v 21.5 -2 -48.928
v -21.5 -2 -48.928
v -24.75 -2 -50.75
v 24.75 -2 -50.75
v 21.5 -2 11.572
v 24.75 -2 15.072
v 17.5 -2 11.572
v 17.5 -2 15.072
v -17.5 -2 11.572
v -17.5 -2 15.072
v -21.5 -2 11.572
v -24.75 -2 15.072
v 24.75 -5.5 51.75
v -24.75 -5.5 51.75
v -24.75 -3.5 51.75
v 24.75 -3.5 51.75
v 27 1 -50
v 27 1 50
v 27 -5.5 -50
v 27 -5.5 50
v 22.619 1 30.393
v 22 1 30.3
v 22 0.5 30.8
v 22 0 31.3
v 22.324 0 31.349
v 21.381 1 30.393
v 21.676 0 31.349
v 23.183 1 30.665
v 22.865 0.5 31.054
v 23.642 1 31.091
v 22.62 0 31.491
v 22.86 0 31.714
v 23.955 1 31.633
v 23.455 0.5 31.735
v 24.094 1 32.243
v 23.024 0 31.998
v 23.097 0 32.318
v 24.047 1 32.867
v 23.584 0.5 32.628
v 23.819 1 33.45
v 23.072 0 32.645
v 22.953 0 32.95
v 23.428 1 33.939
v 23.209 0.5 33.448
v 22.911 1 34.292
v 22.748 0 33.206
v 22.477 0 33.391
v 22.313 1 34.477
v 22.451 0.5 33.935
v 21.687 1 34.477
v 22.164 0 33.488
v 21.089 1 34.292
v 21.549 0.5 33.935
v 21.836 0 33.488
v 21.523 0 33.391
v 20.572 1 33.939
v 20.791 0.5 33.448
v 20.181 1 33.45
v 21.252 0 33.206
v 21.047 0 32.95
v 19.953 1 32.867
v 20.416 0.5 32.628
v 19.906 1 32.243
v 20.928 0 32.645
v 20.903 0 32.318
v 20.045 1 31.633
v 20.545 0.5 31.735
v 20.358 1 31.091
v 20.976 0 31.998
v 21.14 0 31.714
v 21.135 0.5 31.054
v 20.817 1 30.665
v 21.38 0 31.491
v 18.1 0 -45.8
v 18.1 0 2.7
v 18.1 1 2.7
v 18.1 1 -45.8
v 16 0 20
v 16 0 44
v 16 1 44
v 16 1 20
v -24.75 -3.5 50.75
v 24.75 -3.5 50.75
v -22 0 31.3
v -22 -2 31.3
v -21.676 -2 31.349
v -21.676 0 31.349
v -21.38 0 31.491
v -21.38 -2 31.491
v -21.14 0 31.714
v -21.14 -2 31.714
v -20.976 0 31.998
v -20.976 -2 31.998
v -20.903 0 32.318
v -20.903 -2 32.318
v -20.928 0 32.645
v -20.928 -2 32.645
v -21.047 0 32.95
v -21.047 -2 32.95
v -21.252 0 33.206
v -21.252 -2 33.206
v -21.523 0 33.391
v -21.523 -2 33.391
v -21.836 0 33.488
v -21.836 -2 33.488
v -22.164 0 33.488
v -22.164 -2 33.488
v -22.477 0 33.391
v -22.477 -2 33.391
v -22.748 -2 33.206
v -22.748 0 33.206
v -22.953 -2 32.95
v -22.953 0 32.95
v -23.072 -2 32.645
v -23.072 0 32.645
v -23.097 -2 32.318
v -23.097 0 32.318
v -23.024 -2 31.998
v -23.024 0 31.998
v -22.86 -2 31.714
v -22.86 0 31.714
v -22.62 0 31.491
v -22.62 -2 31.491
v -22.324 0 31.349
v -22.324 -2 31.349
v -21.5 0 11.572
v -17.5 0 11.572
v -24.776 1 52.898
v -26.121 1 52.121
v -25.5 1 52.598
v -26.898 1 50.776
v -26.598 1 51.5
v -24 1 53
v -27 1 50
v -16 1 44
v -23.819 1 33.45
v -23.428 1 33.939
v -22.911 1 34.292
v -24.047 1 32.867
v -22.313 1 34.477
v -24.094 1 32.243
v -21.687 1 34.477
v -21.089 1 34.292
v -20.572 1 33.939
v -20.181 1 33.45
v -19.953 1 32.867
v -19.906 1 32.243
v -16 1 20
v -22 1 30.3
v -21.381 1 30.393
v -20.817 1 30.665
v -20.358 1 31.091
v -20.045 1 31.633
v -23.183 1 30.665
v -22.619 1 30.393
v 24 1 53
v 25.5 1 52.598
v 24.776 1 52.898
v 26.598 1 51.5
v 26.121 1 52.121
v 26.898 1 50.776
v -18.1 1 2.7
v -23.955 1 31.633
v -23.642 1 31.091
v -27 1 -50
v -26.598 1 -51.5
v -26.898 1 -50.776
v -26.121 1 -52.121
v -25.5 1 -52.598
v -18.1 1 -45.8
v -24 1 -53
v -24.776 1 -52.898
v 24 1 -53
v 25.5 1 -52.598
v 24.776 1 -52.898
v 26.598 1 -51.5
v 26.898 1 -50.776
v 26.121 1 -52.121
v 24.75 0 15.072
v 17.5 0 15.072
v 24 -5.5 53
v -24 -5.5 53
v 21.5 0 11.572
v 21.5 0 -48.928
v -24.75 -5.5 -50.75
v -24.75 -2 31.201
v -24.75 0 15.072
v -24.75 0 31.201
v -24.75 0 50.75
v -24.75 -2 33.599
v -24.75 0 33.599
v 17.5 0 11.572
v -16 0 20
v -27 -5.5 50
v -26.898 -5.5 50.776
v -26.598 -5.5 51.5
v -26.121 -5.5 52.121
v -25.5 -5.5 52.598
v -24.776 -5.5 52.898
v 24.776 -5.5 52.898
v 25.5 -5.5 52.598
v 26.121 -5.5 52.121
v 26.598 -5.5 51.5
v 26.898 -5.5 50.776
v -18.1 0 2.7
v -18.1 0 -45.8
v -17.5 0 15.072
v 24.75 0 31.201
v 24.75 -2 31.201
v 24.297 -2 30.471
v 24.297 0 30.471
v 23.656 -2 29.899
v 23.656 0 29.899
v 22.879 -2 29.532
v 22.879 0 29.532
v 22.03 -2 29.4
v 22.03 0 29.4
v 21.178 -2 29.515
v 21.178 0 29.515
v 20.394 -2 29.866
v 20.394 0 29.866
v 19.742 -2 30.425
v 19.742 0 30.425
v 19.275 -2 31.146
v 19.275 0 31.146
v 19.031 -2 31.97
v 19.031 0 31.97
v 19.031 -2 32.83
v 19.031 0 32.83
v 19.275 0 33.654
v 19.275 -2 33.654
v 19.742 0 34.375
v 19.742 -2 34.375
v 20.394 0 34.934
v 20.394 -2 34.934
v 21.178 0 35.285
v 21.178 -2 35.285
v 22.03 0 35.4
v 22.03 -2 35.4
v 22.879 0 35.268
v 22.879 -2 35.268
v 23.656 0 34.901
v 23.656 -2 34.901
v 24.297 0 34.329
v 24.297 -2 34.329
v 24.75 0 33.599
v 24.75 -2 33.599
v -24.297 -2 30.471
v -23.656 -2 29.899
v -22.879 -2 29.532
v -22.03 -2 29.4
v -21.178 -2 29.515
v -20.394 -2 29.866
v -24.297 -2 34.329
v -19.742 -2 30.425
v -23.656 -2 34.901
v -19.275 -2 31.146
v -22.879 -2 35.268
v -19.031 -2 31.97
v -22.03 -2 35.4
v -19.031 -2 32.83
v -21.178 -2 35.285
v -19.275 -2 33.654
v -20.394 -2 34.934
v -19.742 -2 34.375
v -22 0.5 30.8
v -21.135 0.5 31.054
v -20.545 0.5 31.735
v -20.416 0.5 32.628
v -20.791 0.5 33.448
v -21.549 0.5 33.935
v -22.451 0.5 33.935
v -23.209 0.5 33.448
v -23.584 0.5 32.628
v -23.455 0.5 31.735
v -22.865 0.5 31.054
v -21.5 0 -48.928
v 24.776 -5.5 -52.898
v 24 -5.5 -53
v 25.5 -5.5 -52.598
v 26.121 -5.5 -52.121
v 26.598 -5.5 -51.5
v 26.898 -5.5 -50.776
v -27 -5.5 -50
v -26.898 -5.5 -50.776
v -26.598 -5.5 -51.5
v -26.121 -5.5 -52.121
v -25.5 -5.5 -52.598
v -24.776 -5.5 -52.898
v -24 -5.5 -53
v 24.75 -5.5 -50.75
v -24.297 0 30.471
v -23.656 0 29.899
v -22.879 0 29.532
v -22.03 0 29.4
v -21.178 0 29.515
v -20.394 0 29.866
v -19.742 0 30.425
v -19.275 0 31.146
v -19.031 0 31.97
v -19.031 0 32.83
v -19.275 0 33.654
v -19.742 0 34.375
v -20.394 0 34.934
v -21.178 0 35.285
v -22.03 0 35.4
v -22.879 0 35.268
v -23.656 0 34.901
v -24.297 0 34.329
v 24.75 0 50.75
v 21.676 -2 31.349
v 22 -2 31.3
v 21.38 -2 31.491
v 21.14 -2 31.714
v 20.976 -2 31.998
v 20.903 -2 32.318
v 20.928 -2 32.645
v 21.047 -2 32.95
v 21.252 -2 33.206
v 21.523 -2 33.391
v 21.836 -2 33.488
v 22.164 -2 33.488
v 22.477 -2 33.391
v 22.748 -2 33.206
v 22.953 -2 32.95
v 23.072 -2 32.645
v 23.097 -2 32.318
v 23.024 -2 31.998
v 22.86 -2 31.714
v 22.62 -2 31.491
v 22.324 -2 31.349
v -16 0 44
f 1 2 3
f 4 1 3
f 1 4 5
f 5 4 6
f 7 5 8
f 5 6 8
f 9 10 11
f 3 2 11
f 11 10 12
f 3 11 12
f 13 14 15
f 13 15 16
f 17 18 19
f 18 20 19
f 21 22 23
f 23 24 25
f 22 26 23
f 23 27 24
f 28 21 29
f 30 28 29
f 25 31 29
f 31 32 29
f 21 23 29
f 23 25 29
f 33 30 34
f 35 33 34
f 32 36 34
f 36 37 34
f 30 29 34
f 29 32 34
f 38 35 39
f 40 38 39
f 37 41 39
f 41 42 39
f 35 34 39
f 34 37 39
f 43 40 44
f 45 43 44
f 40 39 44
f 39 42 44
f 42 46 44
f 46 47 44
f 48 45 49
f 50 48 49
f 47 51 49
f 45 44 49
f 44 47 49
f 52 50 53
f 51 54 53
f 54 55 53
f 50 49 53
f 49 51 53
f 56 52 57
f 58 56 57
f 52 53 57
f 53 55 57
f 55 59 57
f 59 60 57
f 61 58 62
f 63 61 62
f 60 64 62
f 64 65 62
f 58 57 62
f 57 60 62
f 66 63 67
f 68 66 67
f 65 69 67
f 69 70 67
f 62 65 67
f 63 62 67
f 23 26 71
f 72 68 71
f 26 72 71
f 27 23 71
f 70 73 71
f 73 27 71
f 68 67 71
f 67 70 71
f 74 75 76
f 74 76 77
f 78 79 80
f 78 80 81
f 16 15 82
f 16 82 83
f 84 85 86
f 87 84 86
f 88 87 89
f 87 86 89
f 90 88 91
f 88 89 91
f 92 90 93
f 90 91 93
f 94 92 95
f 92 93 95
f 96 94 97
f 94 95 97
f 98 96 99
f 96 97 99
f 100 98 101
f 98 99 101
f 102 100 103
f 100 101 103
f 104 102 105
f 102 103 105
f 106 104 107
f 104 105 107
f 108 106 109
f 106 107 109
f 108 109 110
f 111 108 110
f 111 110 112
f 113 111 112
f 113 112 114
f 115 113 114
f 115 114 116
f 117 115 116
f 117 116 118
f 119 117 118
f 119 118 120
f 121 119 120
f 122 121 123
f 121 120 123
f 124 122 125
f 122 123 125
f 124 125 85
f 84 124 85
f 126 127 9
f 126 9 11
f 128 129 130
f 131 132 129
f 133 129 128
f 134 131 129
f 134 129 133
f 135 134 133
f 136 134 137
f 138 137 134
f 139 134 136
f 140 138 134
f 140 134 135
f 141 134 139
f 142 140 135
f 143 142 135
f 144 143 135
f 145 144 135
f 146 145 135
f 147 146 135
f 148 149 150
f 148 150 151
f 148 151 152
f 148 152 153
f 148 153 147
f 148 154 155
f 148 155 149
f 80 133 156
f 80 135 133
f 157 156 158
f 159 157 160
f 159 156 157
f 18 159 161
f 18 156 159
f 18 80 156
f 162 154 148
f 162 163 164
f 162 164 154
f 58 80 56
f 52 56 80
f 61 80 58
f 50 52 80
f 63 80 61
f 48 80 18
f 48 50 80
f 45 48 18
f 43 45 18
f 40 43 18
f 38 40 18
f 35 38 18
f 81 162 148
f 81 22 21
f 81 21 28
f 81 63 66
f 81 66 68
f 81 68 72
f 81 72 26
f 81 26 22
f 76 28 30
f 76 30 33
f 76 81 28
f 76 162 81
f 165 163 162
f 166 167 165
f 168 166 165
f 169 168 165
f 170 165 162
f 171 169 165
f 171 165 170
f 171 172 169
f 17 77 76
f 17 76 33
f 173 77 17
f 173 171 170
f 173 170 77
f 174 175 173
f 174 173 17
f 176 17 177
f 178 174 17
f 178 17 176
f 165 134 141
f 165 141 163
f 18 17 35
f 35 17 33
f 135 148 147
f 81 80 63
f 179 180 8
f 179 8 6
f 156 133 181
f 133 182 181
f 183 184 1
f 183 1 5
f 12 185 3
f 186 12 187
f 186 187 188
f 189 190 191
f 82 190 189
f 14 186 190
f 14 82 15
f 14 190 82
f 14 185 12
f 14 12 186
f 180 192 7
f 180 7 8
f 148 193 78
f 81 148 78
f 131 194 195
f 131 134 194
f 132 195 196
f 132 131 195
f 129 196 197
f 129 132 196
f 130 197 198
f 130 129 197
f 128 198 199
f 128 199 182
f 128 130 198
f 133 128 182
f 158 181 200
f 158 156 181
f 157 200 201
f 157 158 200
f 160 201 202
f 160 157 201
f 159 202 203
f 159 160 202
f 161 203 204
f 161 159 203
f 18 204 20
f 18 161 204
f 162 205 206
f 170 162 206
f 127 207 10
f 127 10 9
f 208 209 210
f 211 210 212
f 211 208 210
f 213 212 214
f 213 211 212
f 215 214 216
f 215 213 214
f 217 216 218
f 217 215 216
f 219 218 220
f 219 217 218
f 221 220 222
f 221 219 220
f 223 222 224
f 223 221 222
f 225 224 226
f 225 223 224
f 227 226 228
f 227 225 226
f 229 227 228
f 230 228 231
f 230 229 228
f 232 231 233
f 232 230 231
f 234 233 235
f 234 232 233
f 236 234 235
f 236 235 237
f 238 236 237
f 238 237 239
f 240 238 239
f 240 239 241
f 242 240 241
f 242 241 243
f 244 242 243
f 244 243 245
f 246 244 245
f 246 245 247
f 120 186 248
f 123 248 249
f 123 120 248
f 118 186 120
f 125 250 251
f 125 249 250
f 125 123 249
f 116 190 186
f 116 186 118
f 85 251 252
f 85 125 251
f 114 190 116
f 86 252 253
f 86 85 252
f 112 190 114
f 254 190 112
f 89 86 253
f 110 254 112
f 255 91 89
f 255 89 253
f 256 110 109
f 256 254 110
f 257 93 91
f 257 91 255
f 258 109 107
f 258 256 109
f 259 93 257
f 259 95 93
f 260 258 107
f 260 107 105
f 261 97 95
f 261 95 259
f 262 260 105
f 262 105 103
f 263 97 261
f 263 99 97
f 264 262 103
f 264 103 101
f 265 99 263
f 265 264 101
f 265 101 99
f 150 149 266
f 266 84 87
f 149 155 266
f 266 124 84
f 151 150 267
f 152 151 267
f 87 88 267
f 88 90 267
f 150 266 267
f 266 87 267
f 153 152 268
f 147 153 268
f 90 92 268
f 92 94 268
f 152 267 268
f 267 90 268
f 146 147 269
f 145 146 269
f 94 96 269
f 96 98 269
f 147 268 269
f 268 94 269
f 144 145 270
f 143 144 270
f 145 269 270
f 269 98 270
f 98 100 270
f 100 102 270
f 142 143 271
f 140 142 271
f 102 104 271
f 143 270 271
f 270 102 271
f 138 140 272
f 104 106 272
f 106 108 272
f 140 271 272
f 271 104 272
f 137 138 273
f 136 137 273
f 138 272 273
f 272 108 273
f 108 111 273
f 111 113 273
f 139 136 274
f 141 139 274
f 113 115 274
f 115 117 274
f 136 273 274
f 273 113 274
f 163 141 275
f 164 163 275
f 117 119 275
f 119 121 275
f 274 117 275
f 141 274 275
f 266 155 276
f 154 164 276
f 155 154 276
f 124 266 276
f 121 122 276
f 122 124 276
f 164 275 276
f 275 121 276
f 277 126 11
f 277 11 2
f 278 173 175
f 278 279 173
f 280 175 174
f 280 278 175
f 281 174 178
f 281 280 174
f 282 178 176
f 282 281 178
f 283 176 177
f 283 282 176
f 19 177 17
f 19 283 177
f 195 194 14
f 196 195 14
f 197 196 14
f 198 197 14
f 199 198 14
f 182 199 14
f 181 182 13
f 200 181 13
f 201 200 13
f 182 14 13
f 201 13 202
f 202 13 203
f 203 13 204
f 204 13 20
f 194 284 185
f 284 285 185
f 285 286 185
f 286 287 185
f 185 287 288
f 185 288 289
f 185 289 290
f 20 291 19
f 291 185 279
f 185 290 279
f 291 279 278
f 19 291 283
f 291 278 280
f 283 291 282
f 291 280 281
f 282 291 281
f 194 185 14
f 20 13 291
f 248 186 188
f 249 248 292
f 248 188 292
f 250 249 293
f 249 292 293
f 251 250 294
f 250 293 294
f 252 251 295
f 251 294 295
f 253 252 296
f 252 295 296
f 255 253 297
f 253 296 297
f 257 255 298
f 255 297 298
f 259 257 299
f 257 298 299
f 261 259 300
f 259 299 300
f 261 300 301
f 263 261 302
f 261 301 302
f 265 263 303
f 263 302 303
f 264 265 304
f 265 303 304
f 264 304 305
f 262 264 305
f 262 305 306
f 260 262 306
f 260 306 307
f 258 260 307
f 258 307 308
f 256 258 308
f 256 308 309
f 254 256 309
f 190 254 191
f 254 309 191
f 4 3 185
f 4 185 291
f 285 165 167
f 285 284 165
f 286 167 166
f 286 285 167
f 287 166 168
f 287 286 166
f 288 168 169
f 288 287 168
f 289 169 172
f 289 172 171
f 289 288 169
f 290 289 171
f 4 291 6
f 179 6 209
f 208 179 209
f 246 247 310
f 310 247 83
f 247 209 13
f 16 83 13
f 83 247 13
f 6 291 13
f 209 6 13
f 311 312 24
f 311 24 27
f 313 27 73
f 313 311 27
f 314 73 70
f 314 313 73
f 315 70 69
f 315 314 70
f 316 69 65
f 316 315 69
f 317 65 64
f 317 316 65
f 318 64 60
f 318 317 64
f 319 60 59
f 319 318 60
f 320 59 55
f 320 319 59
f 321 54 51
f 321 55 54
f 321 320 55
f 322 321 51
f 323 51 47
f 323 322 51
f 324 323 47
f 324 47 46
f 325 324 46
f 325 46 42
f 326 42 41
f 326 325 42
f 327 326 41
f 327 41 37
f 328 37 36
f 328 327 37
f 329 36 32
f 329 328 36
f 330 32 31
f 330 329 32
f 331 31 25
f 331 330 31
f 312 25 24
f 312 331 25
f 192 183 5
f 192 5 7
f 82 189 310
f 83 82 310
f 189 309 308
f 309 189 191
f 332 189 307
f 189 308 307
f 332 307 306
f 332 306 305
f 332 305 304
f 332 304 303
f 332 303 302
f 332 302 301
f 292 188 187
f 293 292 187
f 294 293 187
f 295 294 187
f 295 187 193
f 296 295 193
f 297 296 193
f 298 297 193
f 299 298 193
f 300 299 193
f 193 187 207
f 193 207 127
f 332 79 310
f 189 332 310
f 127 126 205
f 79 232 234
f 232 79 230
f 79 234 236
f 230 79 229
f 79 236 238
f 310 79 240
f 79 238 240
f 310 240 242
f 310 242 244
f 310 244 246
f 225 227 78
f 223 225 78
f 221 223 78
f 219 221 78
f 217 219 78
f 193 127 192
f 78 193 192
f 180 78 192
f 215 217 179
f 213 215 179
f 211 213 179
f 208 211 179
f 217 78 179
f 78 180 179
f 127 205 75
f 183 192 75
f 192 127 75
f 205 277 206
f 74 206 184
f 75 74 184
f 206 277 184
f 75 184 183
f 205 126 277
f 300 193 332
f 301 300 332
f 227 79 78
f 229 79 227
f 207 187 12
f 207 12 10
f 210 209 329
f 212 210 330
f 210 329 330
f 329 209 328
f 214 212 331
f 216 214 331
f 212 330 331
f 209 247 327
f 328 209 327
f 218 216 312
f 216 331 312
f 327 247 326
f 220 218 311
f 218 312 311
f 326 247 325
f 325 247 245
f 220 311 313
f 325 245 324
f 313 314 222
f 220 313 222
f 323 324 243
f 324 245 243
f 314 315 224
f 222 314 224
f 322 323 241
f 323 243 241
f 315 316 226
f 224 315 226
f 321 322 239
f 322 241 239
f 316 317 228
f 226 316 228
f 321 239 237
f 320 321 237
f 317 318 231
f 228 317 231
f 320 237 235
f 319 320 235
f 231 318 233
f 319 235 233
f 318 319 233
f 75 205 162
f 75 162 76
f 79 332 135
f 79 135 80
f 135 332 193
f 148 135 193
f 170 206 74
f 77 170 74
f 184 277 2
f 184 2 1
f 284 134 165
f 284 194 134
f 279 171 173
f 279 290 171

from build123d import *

# Parameters (mm, degrees)
SKETCH1_W           = 54
SKETCH1_H           = 106
SKETCH1_W_2         = 49.5
SKETCH1_H_2         = 101.5
BOSS_EXTRUDE1_DEPTH = 5.5
SKETCH2_W           = 54
SKETCH2_H           = 106
SKETCH2_W_2         = 36.2
SKETCH2_H_2         = 48.5
SKETCH2_W_3         = 32
SKETCH2_H_3         = 24
BOSS_EXTRUDE2_DEPTH = 1
BOSS_EXTRUDE3_DEPTH = 2
SKETCH4_R           = 3
BOSS_EXTRUDE4_DEPTH = 2
SKETCH5_R           = 1.1
CUT_EXTRUDE1_DEPTH  = 60.73483071
FILLET1_R           = 3
CHAMFER1_SIZE       = 1
SKETCH6_W           = 49.5
SKETCH6_H           = 1
CUT_EXTRUDE2_DEPTH  = 2


with BuildPart() as part:
    # Sketch1 → Boss-Extrude1 (new body)
    with BuildSketch(Plane(origin=(0, 0, 0), x_dir=(1, 0, 0), z_dir=(0, 1, 0))):
        Rectangle(SKETCH1_W, SKETCH1_H)
        Rectangle(SKETCH1_W_2, SKETCH1_H_2, mode=Mode.SUBTRACT)
    extrude(amount=-BOSS_EXTRUDE1_DEPTH)

    # Sketch2 → Boss-Extrude2 (add)
    with BuildSketch(Plane(origin=(0, 0, 0), x_dir=(1, 0, 0), z_dir=(0, 1, 0))):
        Rectangle(SKETCH2_W, SKETCH2_H)
        with Locations((0, 21.55)):
            Rectangle(SKETCH2_W_2, SKETCH2_H_2, mode=Mode.SUBTRACT)
        with Locations((0, -32)):
            Rectangle(SKETCH2_W_3, SKETCH2_H_3, mode=Mode.SUBTRACT)
    extrude(amount=BOSS_EXTRUDE2_DEPTH)

    # Sketch3 → Boss-Extrude3 (add)
    with BuildSketch(Plane.XZ):
        Polygon((21.5, 11.5715), (17.5, 11.5715), (17.5, 15.0715), (25, 15.0715), (25, -52.4285), (-25, -52.4285), (-25, 15.0715), (-17.5, 15.0715), (-17.5, 11.5715), (-21.5, 11.5715), (-21.5, -48.9285), (21.5, -48.9285), align=None)
    extrude(amount=BOSS_EXTRUDE3_DEPTH)

    # Sketch4 → Boss-Extrude4 (add)
    with BuildSketch(Plane.XZ):
        with Locations((-22, 32.4)):
            Circle(SKETCH4_R)
    boss_extrude4 = extrude(amount=BOSS_EXTRUDE4_DEPTH)

    # Sketch5 → Cut-Extrude1 (cut, symmetric)
    with BuildSketch(Plane.XZ):
        with Locations(Location((-22, 32.4, 0), (0, 0, 270))):
            Circle(SKETCH5_R)
    cut_extrude1 = extrude(amount=CUT_EXTRUDE1_DEPTH, both=True, mode=Mode.SUBTRACT)

    # Mirror1: Boss-Extrude4, Cut-Extrude1 across plane
    add(boss_extrude4.mirror(Plane(origin=(0, 0, 0), x_dir=(0, 0, 1), z_dir=(1, 0, 0))))
    add(cut_extrude1.mirror(Plane(origin=(0, 0, 0), x_dir=(0, 0, 1), z_dir=(1, 0, 0))), mode=Mode.SUBTRACT)

    # Fillet1
    fillet1_edges = [part.edges().sort_by_distance(p)[0] for p in [
        (-27, -2.25, -53),
        (27, -2.25, -53),
        (27, -2.25, 53),
        (-27, -2.25, 53),
    ]]
    fillet(fillet1_edges, radius=FILLET1_R)

    # Chamfer1
    chamfer1_edges = [part.edges().sort_by_distance(p)[0] for p in [
        (-22, 1, 33.5),
        (22, 1, 33.5),
    ]]
    chamfer(chamfer1_edges, length=CHAMFER1_SIZE)

    # Sketch6 → Cut-Extrude2 (cut)
    with BuildSketch(Plane.XZ.offset(5.5)):
        with Locations((0, 51.25)):
            Rectangle(SKETCH6_W, SKETCH6_H)
    extrude(amount=-CUT_EXTRUDE2_DEPTH, mode=Mode.SUBTRACT)


solid = part.part
